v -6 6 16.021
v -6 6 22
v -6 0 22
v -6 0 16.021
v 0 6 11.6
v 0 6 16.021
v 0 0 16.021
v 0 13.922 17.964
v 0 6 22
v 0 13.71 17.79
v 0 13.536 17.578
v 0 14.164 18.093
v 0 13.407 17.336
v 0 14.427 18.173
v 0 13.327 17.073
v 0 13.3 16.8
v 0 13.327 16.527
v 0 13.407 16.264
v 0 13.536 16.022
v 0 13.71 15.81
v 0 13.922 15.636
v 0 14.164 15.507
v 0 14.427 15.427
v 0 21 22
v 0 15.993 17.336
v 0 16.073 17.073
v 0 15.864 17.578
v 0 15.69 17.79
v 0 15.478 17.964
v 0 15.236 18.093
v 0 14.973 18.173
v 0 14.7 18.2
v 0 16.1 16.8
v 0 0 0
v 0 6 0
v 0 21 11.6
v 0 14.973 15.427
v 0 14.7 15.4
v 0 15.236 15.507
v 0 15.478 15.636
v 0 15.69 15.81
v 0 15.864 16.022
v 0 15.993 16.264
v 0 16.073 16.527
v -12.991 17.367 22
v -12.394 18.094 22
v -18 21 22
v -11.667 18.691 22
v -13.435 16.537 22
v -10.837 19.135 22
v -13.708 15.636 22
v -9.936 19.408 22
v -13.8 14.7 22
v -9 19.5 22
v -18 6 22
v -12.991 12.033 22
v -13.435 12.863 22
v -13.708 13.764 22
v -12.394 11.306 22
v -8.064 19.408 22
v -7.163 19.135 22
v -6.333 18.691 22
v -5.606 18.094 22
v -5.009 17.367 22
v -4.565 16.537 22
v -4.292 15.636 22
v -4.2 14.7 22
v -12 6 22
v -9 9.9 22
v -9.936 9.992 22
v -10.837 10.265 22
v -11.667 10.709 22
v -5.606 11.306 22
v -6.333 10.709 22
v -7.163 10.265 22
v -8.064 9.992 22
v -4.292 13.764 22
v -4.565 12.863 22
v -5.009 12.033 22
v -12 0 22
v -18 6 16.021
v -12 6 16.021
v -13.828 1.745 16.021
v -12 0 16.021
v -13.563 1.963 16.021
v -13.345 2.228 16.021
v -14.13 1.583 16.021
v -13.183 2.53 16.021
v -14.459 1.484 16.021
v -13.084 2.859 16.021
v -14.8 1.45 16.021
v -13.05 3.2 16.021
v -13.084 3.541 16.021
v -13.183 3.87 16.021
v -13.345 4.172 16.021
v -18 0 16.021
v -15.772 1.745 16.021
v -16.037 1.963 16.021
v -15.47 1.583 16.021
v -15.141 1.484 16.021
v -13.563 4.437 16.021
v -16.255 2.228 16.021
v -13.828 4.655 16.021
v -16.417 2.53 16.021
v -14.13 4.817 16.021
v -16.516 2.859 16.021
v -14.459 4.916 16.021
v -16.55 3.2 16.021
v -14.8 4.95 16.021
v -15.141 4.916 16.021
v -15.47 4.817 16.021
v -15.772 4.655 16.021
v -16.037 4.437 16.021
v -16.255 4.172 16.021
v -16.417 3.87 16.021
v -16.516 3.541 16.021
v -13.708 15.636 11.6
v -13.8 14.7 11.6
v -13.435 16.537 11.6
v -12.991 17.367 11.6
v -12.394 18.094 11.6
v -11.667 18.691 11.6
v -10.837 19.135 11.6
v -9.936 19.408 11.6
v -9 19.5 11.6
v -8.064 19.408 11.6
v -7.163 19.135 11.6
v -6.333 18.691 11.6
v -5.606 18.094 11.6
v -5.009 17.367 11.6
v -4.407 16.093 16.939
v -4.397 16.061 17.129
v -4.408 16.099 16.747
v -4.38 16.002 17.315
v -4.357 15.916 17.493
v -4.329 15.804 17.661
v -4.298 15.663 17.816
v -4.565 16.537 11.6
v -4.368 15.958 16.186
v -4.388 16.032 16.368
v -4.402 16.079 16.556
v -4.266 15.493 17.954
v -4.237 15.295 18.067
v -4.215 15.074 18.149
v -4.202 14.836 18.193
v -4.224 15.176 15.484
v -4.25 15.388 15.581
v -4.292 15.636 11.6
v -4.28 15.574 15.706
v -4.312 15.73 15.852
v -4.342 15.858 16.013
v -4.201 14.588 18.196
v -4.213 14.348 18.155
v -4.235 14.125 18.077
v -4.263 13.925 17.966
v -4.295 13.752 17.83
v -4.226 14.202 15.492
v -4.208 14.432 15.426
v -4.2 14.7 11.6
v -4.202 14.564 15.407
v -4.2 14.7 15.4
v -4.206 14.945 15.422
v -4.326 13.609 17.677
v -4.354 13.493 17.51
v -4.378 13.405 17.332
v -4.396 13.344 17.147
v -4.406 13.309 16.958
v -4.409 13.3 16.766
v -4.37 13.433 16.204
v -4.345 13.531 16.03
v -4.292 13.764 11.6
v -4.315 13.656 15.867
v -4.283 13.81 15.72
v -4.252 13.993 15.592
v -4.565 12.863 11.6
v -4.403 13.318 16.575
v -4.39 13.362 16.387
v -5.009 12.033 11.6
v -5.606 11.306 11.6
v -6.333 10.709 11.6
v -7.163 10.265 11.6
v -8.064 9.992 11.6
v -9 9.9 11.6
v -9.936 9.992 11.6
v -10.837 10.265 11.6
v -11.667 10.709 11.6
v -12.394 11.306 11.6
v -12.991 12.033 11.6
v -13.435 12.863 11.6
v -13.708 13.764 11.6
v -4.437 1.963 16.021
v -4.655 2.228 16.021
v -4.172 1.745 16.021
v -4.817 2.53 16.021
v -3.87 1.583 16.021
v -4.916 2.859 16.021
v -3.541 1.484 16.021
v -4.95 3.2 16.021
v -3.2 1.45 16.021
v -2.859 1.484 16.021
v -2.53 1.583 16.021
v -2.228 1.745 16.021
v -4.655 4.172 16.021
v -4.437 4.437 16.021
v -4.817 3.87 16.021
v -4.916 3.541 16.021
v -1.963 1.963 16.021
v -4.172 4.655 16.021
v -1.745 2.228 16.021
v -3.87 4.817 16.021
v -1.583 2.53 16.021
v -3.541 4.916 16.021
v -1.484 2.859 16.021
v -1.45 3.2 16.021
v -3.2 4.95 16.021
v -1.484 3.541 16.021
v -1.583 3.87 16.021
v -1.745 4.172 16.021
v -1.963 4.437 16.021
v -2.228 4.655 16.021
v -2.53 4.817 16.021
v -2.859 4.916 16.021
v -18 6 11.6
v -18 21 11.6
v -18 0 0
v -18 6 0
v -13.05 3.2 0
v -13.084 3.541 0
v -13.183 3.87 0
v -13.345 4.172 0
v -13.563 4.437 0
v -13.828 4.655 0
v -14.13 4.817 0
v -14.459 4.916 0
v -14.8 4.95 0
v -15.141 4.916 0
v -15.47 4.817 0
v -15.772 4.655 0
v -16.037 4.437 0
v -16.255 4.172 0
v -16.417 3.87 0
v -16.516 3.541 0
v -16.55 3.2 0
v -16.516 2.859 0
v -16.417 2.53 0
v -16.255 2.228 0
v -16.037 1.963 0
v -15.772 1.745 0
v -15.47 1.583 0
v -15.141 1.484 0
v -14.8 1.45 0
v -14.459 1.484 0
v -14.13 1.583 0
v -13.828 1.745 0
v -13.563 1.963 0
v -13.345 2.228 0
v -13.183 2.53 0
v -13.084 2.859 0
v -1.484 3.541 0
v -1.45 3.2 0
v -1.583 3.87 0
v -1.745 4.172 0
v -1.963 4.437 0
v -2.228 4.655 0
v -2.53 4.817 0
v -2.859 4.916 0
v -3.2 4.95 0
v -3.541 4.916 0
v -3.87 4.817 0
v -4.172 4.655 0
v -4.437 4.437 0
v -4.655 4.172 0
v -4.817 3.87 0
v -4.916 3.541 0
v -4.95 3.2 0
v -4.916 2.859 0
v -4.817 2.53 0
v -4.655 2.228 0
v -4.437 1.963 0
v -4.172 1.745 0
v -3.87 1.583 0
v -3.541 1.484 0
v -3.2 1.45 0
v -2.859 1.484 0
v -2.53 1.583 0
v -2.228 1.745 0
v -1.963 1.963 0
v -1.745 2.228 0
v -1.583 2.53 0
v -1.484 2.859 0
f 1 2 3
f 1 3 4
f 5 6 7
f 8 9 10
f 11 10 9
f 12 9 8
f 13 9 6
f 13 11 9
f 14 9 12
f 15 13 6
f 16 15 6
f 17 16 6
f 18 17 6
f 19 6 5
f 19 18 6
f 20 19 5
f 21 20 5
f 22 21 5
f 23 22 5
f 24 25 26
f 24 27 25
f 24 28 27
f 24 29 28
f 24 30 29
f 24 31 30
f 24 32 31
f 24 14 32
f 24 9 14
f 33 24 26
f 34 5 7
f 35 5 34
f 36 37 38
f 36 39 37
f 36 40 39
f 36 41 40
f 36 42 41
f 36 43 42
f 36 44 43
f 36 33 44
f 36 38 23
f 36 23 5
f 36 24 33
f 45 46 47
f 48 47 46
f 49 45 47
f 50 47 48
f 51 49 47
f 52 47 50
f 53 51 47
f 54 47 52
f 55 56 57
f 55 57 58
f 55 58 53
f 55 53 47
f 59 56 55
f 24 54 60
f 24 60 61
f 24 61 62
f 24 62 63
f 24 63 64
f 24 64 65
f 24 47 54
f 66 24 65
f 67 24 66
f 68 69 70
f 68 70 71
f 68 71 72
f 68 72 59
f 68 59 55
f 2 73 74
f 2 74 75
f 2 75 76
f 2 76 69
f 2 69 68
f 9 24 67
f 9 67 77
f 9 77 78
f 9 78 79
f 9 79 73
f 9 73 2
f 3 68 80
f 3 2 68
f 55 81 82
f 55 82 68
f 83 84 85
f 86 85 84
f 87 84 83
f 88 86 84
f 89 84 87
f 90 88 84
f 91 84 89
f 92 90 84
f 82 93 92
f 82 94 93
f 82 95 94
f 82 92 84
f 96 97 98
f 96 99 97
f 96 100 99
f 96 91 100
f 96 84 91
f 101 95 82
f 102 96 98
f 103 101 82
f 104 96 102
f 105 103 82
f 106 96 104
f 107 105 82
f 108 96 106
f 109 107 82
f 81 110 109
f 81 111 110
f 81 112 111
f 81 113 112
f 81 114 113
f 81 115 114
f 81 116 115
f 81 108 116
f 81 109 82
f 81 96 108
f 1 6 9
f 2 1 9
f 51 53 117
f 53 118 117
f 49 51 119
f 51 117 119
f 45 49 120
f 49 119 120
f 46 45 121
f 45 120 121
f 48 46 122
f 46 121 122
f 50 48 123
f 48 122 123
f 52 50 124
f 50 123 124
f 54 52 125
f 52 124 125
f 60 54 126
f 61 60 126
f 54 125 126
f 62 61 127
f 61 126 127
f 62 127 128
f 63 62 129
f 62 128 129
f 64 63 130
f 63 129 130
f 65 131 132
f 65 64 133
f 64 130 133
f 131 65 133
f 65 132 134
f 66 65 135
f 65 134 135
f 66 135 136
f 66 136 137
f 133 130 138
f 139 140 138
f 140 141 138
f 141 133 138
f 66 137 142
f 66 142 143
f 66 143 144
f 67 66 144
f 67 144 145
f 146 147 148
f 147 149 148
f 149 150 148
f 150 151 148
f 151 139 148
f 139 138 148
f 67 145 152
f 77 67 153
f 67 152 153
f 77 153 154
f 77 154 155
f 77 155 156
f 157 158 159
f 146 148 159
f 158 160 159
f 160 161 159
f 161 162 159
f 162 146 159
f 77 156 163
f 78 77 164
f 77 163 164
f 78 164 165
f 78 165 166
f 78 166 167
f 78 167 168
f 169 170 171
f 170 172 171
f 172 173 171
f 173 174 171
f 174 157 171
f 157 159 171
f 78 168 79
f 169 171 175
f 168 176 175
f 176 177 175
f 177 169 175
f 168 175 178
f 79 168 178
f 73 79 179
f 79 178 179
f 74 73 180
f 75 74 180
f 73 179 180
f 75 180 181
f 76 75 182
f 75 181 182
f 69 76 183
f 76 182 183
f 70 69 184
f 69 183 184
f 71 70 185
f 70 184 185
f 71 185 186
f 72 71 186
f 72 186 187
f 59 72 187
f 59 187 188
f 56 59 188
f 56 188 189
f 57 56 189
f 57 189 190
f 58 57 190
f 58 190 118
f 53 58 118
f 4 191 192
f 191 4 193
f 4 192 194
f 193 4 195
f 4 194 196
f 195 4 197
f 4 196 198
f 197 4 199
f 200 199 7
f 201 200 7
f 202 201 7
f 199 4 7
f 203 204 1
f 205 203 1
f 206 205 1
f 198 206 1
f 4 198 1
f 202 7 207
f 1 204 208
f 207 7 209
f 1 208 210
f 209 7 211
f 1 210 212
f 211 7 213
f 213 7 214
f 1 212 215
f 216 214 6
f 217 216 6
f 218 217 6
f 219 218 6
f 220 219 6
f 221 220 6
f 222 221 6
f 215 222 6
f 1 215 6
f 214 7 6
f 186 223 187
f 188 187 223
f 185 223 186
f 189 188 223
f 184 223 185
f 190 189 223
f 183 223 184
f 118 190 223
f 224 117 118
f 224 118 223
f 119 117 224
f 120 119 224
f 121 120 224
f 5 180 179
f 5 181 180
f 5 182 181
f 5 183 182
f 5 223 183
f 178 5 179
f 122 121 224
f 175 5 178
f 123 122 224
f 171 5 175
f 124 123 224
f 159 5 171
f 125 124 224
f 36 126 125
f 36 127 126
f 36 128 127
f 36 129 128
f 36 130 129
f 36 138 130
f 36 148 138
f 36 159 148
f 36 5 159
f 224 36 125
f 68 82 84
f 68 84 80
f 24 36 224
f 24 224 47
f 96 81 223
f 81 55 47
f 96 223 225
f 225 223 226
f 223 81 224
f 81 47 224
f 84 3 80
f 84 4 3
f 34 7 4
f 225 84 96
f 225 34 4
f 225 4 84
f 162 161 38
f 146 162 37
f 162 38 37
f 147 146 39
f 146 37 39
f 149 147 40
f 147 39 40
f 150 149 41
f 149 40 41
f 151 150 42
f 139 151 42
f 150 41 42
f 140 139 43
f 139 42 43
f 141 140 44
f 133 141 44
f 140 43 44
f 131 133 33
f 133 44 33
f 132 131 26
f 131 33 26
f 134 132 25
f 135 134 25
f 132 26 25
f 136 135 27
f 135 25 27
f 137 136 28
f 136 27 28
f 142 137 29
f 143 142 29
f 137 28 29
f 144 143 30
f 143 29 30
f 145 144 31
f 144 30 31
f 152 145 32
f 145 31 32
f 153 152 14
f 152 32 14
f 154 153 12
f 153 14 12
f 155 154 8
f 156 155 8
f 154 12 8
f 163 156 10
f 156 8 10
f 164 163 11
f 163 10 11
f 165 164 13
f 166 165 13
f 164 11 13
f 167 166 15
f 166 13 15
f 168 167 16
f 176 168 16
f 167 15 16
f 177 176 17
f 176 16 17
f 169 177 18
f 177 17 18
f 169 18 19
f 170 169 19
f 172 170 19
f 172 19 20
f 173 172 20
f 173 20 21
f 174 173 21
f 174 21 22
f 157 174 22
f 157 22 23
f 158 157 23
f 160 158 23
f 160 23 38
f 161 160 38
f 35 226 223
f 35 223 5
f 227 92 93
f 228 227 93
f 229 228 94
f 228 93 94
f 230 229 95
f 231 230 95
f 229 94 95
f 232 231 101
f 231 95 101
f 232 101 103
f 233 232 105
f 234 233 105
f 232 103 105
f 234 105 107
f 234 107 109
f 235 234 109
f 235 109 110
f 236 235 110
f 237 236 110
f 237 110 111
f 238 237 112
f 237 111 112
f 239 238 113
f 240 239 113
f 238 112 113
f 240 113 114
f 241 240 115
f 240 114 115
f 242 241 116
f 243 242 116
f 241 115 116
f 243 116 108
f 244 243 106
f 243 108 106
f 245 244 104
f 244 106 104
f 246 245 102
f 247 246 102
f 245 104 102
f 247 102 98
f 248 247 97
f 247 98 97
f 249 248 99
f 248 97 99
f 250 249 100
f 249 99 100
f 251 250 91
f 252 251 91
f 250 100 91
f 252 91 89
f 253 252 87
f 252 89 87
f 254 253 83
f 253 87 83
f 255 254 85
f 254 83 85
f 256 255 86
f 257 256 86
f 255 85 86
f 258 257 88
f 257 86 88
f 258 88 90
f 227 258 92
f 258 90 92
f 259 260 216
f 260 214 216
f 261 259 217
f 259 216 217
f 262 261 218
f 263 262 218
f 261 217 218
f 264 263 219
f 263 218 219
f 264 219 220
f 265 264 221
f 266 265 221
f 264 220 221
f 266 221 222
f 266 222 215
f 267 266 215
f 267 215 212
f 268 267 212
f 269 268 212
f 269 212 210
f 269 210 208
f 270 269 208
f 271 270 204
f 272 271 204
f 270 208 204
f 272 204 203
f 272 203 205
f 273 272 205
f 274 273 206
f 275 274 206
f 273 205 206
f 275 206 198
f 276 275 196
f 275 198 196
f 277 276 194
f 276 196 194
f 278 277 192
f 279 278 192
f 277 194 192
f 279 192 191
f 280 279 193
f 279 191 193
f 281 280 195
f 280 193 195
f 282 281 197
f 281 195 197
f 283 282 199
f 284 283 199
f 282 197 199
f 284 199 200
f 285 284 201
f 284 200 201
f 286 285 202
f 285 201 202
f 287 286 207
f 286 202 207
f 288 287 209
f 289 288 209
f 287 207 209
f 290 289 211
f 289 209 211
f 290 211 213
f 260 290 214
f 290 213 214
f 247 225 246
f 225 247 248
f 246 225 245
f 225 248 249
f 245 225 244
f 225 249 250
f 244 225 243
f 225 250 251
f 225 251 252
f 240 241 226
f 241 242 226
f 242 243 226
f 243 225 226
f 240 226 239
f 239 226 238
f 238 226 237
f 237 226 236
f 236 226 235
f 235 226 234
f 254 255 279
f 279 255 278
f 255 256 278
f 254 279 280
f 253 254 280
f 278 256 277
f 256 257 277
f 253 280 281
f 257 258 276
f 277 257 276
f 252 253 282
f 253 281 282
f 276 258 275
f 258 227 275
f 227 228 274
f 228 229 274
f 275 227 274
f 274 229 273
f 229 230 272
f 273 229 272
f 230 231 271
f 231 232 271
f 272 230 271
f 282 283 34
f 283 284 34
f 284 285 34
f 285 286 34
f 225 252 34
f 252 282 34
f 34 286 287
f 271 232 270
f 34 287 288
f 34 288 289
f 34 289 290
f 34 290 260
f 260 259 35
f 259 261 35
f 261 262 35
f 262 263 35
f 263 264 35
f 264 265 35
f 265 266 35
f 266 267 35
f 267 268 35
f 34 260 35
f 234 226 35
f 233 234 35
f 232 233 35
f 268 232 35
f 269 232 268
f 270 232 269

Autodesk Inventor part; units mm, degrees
ref_plane "YZ Plane" through (0, 0, 0) normal (1, 0, 0) x (0, 1, 0)
ref_plane "XZ Plane" through (0, 0, 0) normal (0, 1, 0) x (-1, 0, 0)
ref_plane "XY Plane" through (0, 0, 0) normal (0, 0, 1) x (1, 0, 0)
sketch "Sketch1" plane through (0, 0, 0) normal (0, 0, 1) x (1, 0, 0)
  line L0 (0, 0) -> (-18, 0)
  line L1 (-18, 0) -> (-18, 6)
  line L2 (-18, 6) -> (0, 6)
  line L3 (0, 6) -> (0, 0)
  dimension "d0" = 18
  dimension "d1" = 6
extrude "Extrusion1" add sketch "Sketch1" along normal blind 22
sketch "Sketch2" plane through (0, 0, 22) normal (0, 0, 1) x (1, 0, 0)
  line L0 (-18, 0) -> (0, 0) projected
  line L1 (0, 0) -> (0, 6) projected
  line L2 (0, 6) -> (-18, 6) projected
  line L3 (-18, 6) -> (-18, 0) projected
  circle A0 centre (-14.8, 3.2) radius 1.75
  circle A1 centre (-3.2, 3.2) radius 1.75
  dimension "d4" = 3.5
  dimension "d5" = 3.5
  dimension "d6" = 2.8
  dimension "d7" = 2.8
  dimension "d8" = 3.2
  dimension "d9" = 3.2
extrude "Extrusion2" cut sketch "Sketch2" against normal through all contours A0 | A1
sketch "Sketch3" plane through (0, 0, 0) normal (1, 0, 0) x (0, 0, -1)
  line L0 (0, 6) -> (0, 0) projected
  line L1 (0, 6) -> (-22, 6) projected
  line L2 (-22, 0) -> (-22, 6) projected
  line L3 (0, 0) -> (-22, 0) projected
  line L4 (0, 6) -> (-22, 6) projected
  line L5 (-22, 6) -> (-11.6, 6)
  line L6 (-11.6, 6) -> (-11.6, 21)
  line L7 (-11.6, 21) -> (-22, 21)
  line L8 (-22, 21) -> (-22, 6)
  dimension "d12" = 10.4
  dimension "d13" = 15
extrude "Extrusion3" add sketch "Sketch3" against normal up to surface (18 mm away) contours L1 L8 L7 L6
sketch "Sketch4" plane through (0, 6, 11.6) normal (0, 0, -1) x (-1, 0, 0)
  line L0 (18, 0) -> (18, 15) projected
  line L1 (0, 15) -> (18, 15) projected
  line L2 (0, 15) -> (0, 0) projected
  line L3 (18, 0) -> (0, 0) projected
  circle A0 centre (9, 8.7) radius 4.8
  point P0 (0, -6)
  dimension "d16" = 9.6
  dimension "d17" = 6.3
extrude "Extrusion4" cut sketch "Sketch4" against normal through all contours A0
sketch "Sketch5" plane through (-18, 0, 0) normal (-1, 0, 0) x (0, 0, 1)
  line L0 (22.0213, 0) -> (16.0213, 0)
  line L1 (16.0213, 0) -> (16.0213, 6)
  line L2 (16.0213, 6) -> (22.0213, 6)
  line L3 (22.0213, 6) -> (22.0213, 0)
  point P0 (0, 0)
  dimension "d20" = 6
  dimension "d21" = 6
extrude "Extrusion5" cut sketch "Sketch5" against normal blind 6
sketch "Sketch6" plane through (0, 0, 0) normal (1, 0, 0) x (0, 0, -1)
  line L0 (-22, 6) -> (-22, 0) projected
  line L1 (-16.0213, 6) -> (-22, 6) projected
  line L2 (-16.0213, 0) -> (-16.0213, 6) projected
  line L3 (-22, 0) -> (-16.0213, 0) projected
  point P0 (0, 0)
extrude "Extrusion6" cut sketch "Sketch6" against normal blind 6
sketch "Sketch7" plane through (0, 0, 0) normal (1, 0, 0) x (0, 0, -1)
  line L0 (-6.6, 12.2) -> (-11.6, 12.2)
  line L1 (-6.6, 17.2) -> (-11.6, 17.2)
  line L2 (-11.6, 21) -> (-11.6, 6) projected
  line L3 (-22, 6) -> (-22, 21) projected
  circle A0 centre (-16.8, 14.7) radius 1.4
  point P0 (0, 0)
  dimension "d26" = 2.8
  dimension "d27" = 5.2
  dimension "d28" = 2.5
extrude "Extrusion7" cut sketch "Sketch7" against normal blind 6
properties part number "00_micrometer_moun_xystage_china"
